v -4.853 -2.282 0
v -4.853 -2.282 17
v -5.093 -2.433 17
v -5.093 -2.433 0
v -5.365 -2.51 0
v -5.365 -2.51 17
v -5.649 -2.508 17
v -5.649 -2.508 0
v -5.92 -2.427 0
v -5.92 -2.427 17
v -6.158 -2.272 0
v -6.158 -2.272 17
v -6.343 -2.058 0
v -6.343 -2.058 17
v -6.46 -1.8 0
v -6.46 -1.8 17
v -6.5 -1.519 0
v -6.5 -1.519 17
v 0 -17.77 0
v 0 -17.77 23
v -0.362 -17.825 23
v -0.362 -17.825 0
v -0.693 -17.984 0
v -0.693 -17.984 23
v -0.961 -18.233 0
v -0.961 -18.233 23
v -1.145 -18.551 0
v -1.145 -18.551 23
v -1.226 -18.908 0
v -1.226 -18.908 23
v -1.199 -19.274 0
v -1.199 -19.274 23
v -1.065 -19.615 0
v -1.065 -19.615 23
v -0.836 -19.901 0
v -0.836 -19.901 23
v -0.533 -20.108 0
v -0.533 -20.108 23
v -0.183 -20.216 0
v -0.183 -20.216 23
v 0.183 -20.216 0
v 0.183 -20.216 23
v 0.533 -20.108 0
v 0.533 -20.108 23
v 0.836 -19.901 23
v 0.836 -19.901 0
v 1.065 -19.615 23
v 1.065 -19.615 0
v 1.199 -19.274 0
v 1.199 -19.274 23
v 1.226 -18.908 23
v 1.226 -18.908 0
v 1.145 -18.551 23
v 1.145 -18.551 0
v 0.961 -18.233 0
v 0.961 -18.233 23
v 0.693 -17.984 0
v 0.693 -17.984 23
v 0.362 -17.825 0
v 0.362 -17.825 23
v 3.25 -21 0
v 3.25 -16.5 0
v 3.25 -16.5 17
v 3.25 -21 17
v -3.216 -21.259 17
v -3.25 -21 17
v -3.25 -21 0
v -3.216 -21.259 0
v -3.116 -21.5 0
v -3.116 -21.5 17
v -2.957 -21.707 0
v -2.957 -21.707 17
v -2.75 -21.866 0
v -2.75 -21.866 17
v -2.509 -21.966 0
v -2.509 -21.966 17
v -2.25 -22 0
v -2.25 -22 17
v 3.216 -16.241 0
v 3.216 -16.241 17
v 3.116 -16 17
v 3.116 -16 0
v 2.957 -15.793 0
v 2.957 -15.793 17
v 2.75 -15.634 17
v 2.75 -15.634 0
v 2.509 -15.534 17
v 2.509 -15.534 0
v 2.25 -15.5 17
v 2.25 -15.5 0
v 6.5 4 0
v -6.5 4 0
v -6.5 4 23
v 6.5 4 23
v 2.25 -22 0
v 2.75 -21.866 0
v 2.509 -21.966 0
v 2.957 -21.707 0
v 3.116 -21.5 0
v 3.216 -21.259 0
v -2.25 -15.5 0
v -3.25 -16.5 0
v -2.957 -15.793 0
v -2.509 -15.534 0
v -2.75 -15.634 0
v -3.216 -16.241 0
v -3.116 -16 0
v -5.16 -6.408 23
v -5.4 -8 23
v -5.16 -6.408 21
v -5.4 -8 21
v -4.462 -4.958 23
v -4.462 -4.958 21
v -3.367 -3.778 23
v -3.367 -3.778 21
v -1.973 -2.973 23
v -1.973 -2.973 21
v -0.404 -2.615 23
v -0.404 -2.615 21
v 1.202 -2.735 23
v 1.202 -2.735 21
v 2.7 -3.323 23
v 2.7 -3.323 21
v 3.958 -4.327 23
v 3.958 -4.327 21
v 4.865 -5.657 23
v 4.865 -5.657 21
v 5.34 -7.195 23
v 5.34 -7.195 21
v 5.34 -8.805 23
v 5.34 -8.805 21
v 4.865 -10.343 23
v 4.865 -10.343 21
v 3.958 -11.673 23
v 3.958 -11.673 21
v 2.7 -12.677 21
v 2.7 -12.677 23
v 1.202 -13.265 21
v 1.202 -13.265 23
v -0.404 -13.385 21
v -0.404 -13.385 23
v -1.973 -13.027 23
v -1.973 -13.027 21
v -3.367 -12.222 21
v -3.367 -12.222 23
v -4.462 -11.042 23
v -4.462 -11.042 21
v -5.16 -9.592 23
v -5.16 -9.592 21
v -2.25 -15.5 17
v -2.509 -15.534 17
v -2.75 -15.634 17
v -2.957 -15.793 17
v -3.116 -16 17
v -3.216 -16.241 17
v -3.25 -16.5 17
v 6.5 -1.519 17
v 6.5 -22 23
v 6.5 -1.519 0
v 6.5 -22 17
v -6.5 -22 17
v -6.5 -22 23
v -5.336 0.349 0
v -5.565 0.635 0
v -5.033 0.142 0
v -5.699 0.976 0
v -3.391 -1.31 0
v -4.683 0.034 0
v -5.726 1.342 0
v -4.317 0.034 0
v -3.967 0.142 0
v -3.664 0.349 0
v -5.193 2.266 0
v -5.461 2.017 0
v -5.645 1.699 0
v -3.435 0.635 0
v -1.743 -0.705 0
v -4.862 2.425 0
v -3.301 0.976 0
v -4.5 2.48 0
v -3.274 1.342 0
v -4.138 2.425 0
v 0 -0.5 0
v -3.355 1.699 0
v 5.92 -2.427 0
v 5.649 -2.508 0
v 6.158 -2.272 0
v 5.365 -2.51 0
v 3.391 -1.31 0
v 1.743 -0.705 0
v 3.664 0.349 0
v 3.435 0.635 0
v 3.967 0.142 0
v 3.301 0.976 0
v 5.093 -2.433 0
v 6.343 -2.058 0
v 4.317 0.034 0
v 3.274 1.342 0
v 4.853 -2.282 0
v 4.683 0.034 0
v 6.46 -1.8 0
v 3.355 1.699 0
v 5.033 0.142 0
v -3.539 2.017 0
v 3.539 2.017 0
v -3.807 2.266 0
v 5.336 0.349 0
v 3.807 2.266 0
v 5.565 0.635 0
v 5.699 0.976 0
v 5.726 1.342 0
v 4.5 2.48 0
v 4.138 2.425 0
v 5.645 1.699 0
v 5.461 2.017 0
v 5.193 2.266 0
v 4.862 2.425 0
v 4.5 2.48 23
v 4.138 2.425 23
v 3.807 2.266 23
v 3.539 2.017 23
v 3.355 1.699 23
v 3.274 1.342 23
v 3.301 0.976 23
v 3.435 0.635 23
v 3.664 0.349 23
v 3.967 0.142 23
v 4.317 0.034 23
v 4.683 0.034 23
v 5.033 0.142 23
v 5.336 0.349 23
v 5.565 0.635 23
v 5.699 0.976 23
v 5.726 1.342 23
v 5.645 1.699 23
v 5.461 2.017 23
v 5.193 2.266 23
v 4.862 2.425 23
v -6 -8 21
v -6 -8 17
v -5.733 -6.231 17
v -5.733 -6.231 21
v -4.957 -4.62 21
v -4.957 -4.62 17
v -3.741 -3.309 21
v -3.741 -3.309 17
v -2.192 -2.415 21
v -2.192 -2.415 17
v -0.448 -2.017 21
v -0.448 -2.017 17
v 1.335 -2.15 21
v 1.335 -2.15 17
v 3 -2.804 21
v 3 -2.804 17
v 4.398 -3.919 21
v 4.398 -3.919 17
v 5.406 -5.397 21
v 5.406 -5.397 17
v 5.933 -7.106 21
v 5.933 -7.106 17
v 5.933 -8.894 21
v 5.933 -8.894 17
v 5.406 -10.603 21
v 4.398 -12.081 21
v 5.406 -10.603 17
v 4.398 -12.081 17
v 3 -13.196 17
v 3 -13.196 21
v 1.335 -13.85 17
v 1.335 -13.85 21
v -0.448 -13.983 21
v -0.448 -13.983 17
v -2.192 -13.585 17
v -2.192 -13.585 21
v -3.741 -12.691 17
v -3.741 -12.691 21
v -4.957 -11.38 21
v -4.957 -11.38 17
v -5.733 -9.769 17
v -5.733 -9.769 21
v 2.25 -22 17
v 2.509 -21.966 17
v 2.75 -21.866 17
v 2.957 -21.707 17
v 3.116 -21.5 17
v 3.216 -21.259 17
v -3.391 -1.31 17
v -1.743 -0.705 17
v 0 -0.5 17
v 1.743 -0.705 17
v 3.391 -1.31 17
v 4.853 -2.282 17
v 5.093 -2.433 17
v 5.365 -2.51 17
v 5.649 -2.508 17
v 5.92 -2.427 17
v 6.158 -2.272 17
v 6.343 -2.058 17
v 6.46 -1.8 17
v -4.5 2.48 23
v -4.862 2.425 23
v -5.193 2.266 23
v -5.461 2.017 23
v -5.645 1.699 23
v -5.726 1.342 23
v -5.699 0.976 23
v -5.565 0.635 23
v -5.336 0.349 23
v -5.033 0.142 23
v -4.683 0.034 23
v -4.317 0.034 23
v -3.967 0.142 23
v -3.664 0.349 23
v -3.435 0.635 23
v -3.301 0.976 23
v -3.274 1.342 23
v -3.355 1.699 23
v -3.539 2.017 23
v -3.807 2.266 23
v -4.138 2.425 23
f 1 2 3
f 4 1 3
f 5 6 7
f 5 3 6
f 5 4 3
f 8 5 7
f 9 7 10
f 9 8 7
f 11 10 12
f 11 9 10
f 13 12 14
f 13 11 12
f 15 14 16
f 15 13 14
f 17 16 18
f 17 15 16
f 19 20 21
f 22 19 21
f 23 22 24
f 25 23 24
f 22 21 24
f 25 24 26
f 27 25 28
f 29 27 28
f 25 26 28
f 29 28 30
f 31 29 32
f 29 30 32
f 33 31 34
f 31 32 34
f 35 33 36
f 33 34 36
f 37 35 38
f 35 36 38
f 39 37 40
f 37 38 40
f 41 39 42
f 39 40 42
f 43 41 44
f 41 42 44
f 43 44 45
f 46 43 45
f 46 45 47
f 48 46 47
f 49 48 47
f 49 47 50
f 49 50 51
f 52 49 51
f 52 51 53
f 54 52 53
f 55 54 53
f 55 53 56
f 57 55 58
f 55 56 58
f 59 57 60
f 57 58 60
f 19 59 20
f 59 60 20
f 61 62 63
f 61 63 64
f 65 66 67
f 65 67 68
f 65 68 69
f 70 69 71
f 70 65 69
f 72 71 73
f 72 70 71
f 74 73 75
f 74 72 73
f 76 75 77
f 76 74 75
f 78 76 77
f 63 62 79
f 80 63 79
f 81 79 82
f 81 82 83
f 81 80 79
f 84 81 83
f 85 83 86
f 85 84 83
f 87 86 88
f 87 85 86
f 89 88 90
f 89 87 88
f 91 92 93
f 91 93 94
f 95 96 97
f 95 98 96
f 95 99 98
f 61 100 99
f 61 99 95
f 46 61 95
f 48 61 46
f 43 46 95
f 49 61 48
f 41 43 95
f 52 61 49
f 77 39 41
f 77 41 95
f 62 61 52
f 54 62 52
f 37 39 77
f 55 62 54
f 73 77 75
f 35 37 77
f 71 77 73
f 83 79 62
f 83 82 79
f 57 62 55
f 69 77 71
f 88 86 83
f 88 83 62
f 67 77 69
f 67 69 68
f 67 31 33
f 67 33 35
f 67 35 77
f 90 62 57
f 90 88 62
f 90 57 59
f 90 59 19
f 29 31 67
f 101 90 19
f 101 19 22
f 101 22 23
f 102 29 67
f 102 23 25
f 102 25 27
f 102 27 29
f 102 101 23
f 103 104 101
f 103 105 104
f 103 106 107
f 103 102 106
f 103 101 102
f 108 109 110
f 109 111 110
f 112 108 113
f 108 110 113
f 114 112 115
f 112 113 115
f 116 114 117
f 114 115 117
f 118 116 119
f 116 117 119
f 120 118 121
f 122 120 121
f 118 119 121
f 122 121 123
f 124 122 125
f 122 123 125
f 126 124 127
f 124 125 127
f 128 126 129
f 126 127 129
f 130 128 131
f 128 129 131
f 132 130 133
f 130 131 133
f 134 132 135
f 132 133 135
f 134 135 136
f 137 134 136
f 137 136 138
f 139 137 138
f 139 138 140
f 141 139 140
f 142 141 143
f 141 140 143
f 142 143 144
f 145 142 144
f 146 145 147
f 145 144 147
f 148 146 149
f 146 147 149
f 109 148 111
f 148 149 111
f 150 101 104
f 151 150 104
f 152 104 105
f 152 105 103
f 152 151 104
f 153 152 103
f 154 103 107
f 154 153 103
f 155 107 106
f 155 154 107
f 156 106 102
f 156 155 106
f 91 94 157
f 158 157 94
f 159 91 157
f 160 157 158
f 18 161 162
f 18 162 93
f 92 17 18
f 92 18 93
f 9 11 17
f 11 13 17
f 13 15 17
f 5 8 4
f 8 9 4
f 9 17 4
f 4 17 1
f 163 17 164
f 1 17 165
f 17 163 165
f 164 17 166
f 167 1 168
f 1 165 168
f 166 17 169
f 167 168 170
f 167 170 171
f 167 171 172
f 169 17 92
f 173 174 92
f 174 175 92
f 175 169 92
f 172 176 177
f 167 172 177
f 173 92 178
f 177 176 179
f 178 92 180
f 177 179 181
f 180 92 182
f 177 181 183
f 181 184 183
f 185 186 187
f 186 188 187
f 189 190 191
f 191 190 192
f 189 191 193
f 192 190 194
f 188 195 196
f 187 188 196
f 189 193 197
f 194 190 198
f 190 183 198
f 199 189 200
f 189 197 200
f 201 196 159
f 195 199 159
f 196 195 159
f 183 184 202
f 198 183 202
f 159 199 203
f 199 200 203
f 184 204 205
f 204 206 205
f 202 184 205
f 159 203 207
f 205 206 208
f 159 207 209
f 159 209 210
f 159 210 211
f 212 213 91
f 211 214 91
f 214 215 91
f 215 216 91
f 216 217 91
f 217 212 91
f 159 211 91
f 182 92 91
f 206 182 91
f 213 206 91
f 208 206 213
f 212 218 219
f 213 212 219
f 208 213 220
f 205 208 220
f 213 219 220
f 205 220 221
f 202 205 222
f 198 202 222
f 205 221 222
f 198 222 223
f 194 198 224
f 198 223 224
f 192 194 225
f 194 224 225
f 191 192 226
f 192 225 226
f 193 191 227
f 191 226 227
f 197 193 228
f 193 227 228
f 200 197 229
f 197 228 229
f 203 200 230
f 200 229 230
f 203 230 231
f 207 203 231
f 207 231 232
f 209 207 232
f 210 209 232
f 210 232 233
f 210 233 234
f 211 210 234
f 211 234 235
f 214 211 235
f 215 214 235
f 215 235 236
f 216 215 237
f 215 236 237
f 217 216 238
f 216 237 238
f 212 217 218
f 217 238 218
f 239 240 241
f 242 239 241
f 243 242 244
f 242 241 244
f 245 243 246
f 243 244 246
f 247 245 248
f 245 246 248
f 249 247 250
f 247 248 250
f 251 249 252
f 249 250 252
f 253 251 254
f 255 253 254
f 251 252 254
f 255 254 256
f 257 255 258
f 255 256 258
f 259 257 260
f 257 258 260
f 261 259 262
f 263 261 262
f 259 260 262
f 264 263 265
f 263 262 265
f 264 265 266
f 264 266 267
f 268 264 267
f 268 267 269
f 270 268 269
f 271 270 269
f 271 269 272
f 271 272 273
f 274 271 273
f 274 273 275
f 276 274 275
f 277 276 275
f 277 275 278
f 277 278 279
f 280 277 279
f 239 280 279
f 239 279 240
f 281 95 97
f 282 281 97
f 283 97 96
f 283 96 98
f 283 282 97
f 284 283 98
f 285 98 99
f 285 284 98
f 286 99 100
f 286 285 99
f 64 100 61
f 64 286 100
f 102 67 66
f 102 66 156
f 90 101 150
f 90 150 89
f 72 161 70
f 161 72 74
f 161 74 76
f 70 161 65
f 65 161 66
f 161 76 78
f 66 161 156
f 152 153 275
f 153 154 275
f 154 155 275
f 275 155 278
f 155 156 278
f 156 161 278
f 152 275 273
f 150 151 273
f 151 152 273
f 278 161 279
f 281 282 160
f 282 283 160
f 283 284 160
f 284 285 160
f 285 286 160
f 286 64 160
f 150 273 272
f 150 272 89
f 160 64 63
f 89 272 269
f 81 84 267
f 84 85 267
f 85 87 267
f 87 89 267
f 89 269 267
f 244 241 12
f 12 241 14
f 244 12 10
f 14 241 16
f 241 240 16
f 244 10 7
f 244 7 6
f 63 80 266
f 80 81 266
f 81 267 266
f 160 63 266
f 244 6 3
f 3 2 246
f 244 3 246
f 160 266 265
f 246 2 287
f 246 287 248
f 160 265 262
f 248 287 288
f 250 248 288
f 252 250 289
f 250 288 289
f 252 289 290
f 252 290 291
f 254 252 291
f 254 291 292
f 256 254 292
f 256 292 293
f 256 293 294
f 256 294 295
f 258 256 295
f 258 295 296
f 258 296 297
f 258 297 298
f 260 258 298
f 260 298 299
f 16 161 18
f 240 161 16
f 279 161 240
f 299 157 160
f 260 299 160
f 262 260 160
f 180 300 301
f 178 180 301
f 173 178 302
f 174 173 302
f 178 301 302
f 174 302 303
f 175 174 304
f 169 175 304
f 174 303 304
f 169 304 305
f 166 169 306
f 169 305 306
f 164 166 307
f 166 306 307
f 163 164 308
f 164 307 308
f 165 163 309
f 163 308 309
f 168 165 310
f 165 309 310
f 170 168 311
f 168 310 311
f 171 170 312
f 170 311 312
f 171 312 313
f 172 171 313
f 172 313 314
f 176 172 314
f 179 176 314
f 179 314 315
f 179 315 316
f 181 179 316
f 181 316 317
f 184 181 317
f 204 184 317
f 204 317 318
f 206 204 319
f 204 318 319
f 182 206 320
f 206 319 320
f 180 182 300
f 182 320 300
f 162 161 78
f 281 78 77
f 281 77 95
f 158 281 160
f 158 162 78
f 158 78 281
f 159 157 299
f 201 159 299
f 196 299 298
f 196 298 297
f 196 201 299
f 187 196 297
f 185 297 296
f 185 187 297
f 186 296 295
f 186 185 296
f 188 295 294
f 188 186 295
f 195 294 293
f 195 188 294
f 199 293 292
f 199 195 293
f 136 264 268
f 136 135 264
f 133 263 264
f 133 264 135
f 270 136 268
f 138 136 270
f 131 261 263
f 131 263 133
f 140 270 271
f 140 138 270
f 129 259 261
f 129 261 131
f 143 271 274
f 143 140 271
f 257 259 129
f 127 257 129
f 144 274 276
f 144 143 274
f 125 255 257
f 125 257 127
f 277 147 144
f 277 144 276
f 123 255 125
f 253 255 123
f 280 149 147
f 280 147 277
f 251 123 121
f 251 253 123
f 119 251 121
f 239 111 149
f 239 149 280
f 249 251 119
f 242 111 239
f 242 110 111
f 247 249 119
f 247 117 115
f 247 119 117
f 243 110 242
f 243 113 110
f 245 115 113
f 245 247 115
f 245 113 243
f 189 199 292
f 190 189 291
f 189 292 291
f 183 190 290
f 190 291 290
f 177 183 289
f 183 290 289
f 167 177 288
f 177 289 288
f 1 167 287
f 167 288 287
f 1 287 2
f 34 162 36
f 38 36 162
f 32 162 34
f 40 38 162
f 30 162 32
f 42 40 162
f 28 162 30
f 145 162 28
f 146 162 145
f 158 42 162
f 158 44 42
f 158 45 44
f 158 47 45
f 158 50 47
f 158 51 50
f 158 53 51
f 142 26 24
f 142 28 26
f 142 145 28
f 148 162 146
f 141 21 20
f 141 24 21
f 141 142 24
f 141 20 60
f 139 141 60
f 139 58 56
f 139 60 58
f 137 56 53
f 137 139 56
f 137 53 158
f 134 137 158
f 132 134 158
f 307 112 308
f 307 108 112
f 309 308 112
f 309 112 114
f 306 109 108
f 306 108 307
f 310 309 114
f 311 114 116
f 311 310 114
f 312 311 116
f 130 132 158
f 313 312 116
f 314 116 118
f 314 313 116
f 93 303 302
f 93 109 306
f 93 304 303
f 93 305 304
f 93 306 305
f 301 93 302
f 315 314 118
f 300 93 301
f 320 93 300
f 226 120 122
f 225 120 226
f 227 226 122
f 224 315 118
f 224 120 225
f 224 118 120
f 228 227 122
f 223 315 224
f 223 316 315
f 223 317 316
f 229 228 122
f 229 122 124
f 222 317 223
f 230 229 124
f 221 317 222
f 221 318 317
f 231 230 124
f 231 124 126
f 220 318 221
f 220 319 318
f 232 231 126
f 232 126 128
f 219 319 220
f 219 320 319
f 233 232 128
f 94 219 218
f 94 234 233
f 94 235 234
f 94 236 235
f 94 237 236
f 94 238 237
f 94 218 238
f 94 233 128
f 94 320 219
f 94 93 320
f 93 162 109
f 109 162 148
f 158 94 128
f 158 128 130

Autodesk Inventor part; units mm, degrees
ref_plane "YZ Plane" through (0, 0, 0) normal (1, 0, 0) x (0, 1, 0)
ref_plane "XZ Plane" through (0, 0, 0) normal (0, 1, 0) x (-1, 0, 0)
ref_plane "XY Plane" through (0, 0, 0) normal (0, 0, 1) x (1, 0, 0)
sketch "Sketch1" plane through (0, 0, 0) normal (0, 0, 1) x (1, 0, 0)
  line L0 (-6.5, 4) -> (6.5, 4)
  line L1 (6.5, 4) -> (6.5, -4)
  line L2 (6.5, -4) -> (-6.5, -4)
  line L3 (-6.5, -4) -> (-6.5, 4)
  line L4 (-6.5, 4) -> (6.5, -4) construction
  line L5 (6.5, 4) -> (-6.5, -4) construction
  point P0 (0, 0)
  point P1 (4.5, 1.25)
  point P2 (-4.5, 1.25)
  dimension "d0" = 13
  dimension "d1" = 8
  dimension "d64" = 2.75
  dimension "d65" = 2
  dimension "d66" = 2.75
  dimension "d67" = 2
extrude "Extrusion1" add sketch "Sketch1" along normal blind 48
hole "Hole1" at (-4.5, 1.25, 0) at (4.5, 1.25, 0) direction (0, 0, 1) diameter 2.459 end through all thread size "M3x0.5" class "6H" standard "ISO Metric profile"
sketch "Sketch6" plane through (-6.5, -4, 0) normal (0, -1, 0) x (1, 0, 0)
  line L0 (0.2, 0) -> (0, 0) projected
  line L1 (12.8, 0) -> (12.8, 36.9748) projected
  line L2 (0, 0) -> (12.8, 0)
  line L3 (12.8, 0) -> (12.8, 17)
  line L4 (12.8, 17) -> (0, 17)
  line L5 (0, 17) -> (0, 0)
  line L6 (13, 0) -> (13, 48) projected
  line L7 (0, 17) -> (13, 17)
  line L8 (13, 17) -> (13, 23)
  line L9 (13, 23) -> (0, 23)
  line L10 (0, 23) -> (0, 17)
  point P0 (6.5, 0)
  point P1 (12.8, 36.8338)
  point P2 (13, 36.8338)
  point P3 (13, 37.0101)
  dimension "d60" = 17
  dimension "d61" = 6
extrude "Extrusion3" add sketch "Sketch6" along normal blind 18 contours L10 L9 L1 L4 | L1 L9 L6 L7
sketch "Sketch7" plane through (6.5, -4, 17) normal (0, 0, -1) x (-1, 0, 0)
  line L0 (13, 8) -> (0, 8) projected
  circle A0 centre (6.5, -4) radius 6
  point P0 (6.5, 4)
  dimension "d68" = 12
  dimension "d69" = 12
extrude "Extrusion4" cut sketch "Sketch7" against normal blind 4
sketch "Sketch8" plane through (6.5, -22, 17) normal (0, 0, -1) x (-1, 0, 0)
  circle A0 centre (6.5, 14) radius 6 projected
  circle A1 centre (6.5, 14) radius 7.5
  point P0 (6.5, 22)
  dimension "d72" = 15
extrude "Extrusion5" cut sketch "Sketch8" along normal through all contours A0 | A1
sketch "Sketch9" plane through (0, -8, 21) normal (0, 0, -1) x (-1, 0, 0)
  circle A0 centre (0, 0) radius 5.4
  point P0 (0, 8)
  dimension "d75" = 10.8
extrude "Extrusion6" cut sketch "Sketch9" against normal up to surface (2 mm away)
sketch "Sketch10" plane through (6.5, -22, 17) normal (0, 0, -1) x (-1, 0, 0)
  line L0 (3.25, 6.5) -> (3.25, 0)
  line L1 (3.25, 0) -> (9.75, 0)
  line L2 (9.75, 0) -> (9.75, 6.5)
  line L3 (9.75, 6.5) -> (3.25, 6.5)
  line L4 (3.25, 6.5) -> (9.75, 0) construction
  line L5 (3.25, 0) -> (9.75, 6.5) construction
  circle A0 centre (6.5, 14) radius 6 projected
  circle A1 centre (6.5, 14) radius 7.5 projected
  point P0 (6.5, 22)
  point P1 (6.5, 3.25)
  dimension "d78" = 6.5
  dimension "d80" = 6.5
  dimension "d81" = 3.25
  dimension "d95" = 7.5
extrude "Extrusion7" add sketch "Sketch10" along normal up to surface (17 mm away) contours L3 L2 L1 L0
sketch "Sketch11" plane through (3.25, -15.5, 0) normal (0, 0, -1) x (-1, 0, 0)
  line L0 (9.75, 19.5) -> (-3.25, 19.5) projected
  line L1 (-3.25, 19.5) -> (-3.25, 11.5) projected
  line L2 (6.5, 0) -> (0, 0) projected
  point P0 (3.25, 15.5)
  point P1 (3.25, -3.5)
  point P2 (9.55, 19.5)
  point P3 (-3.05, 19.5)
  point P4 (-3.25, 19.3)
  dimension "d85" = 6.5
  dimension "d96" = 3.5
  dimension "d97" = 23
hole "Hole5" at (0, -19, 0) direction (0, 0, 1) diameter 2.459 end through all thread size "M3x0.5" class "6H" standard "ISO Metric profile"
fillet "Fillet2" radius 1 8 edges at (-6.3443, -4, 8.5) (6.3443, -4, 8.5) (-6.5, -4, 8.5) (6.5, -4, 8.5) (-3.25, -15.5, 8.5) (3.25, -15.5, 8.5) (3.25, -22, 8.5) (-3.25, -22, 8.5)
sketch "Sketch13" plane through (0, 0, 0) normal (0, 0, -1) x (-1, 0, 0)
  point P0 (-4.5, 1.25)
move faces "Move1" translate (0, 0, -25) faces at (-1.2282, -2.5568, 48)
sketch "Sketch15" plane through (-6.5, -22, 23) normal (0, 0, 1) x (1, 0, 0)
  point P0 (6.5, 22)
equation "\"d66\" = d64"
equation "\"d67\" = d65"
equation "\"d81\" = 0.5 * d78"
properties part number "cam-flying-mount-rev2" material "Aluminum 6061"
